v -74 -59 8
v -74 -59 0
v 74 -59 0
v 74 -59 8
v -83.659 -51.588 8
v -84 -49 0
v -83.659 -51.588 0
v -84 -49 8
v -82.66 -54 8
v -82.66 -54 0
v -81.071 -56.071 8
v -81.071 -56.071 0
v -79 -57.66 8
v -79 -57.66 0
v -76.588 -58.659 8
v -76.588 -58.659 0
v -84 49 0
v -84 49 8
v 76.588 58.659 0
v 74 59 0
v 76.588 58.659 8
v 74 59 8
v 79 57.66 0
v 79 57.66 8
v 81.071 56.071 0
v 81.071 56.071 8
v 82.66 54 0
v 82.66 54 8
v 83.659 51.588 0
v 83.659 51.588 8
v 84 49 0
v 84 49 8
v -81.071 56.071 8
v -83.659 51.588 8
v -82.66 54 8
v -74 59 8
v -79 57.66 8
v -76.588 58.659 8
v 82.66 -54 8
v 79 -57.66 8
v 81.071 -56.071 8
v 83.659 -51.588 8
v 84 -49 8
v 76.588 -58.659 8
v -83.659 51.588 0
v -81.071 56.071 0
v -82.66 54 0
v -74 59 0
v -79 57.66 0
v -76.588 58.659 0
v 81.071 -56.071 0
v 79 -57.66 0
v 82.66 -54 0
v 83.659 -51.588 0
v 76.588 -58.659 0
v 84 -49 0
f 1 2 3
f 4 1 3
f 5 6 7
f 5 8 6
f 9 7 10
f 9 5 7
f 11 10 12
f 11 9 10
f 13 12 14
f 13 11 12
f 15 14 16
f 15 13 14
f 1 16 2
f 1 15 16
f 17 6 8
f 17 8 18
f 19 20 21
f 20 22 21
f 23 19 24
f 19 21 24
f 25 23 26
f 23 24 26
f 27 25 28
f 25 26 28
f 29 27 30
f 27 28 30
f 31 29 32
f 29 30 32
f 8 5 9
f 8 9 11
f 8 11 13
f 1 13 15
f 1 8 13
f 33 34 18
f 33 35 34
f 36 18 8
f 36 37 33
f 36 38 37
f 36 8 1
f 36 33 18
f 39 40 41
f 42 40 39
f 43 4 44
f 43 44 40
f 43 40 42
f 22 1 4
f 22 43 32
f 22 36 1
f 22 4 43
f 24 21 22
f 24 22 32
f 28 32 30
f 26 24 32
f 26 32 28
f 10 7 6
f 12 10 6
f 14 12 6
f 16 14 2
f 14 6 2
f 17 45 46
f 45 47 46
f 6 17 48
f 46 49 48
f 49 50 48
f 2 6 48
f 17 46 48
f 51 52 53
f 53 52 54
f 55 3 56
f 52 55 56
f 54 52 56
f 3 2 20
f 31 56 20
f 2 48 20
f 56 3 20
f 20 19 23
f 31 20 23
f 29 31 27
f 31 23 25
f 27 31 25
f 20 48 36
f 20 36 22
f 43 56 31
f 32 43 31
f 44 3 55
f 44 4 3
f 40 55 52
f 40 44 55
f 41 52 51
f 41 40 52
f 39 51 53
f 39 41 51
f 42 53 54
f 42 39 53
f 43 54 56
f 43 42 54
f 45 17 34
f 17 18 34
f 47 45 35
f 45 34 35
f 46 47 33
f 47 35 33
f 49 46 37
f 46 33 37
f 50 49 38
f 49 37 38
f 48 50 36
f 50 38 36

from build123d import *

# Parameters (mm, degrees)
SKETCH_W    = 168
SKETCH_H    = 118
PAD_DEPTH   = 8
FILLET_R    = 10
FILLET001_R = 10


with BuildPart() as part:
    # Sketch → Pad (new body)
    with BuildSketch(Plane.XY):
        Rectangle(SKETCH_W, SKETCH_H)
    extrude(amount=PAD_DEPTH)

    # Fillet
    fillet_edges = [part.edges().sort_by_distance(p)[0] for p in [
        (-84, -59, 4),
    ]]
    fillet(fillet_edges, radius=FILLET_R)

    # Fillet001
    fillet001_edges = [part.edges().sort_by_distance(p)[0] for p in [
        (-84, 59, 4),
        (84, 59, 4),
        (84, -59, 4),
    ]]
    fillet(fillet001_edges, radius=FILLET001_R)


solid = part.part
